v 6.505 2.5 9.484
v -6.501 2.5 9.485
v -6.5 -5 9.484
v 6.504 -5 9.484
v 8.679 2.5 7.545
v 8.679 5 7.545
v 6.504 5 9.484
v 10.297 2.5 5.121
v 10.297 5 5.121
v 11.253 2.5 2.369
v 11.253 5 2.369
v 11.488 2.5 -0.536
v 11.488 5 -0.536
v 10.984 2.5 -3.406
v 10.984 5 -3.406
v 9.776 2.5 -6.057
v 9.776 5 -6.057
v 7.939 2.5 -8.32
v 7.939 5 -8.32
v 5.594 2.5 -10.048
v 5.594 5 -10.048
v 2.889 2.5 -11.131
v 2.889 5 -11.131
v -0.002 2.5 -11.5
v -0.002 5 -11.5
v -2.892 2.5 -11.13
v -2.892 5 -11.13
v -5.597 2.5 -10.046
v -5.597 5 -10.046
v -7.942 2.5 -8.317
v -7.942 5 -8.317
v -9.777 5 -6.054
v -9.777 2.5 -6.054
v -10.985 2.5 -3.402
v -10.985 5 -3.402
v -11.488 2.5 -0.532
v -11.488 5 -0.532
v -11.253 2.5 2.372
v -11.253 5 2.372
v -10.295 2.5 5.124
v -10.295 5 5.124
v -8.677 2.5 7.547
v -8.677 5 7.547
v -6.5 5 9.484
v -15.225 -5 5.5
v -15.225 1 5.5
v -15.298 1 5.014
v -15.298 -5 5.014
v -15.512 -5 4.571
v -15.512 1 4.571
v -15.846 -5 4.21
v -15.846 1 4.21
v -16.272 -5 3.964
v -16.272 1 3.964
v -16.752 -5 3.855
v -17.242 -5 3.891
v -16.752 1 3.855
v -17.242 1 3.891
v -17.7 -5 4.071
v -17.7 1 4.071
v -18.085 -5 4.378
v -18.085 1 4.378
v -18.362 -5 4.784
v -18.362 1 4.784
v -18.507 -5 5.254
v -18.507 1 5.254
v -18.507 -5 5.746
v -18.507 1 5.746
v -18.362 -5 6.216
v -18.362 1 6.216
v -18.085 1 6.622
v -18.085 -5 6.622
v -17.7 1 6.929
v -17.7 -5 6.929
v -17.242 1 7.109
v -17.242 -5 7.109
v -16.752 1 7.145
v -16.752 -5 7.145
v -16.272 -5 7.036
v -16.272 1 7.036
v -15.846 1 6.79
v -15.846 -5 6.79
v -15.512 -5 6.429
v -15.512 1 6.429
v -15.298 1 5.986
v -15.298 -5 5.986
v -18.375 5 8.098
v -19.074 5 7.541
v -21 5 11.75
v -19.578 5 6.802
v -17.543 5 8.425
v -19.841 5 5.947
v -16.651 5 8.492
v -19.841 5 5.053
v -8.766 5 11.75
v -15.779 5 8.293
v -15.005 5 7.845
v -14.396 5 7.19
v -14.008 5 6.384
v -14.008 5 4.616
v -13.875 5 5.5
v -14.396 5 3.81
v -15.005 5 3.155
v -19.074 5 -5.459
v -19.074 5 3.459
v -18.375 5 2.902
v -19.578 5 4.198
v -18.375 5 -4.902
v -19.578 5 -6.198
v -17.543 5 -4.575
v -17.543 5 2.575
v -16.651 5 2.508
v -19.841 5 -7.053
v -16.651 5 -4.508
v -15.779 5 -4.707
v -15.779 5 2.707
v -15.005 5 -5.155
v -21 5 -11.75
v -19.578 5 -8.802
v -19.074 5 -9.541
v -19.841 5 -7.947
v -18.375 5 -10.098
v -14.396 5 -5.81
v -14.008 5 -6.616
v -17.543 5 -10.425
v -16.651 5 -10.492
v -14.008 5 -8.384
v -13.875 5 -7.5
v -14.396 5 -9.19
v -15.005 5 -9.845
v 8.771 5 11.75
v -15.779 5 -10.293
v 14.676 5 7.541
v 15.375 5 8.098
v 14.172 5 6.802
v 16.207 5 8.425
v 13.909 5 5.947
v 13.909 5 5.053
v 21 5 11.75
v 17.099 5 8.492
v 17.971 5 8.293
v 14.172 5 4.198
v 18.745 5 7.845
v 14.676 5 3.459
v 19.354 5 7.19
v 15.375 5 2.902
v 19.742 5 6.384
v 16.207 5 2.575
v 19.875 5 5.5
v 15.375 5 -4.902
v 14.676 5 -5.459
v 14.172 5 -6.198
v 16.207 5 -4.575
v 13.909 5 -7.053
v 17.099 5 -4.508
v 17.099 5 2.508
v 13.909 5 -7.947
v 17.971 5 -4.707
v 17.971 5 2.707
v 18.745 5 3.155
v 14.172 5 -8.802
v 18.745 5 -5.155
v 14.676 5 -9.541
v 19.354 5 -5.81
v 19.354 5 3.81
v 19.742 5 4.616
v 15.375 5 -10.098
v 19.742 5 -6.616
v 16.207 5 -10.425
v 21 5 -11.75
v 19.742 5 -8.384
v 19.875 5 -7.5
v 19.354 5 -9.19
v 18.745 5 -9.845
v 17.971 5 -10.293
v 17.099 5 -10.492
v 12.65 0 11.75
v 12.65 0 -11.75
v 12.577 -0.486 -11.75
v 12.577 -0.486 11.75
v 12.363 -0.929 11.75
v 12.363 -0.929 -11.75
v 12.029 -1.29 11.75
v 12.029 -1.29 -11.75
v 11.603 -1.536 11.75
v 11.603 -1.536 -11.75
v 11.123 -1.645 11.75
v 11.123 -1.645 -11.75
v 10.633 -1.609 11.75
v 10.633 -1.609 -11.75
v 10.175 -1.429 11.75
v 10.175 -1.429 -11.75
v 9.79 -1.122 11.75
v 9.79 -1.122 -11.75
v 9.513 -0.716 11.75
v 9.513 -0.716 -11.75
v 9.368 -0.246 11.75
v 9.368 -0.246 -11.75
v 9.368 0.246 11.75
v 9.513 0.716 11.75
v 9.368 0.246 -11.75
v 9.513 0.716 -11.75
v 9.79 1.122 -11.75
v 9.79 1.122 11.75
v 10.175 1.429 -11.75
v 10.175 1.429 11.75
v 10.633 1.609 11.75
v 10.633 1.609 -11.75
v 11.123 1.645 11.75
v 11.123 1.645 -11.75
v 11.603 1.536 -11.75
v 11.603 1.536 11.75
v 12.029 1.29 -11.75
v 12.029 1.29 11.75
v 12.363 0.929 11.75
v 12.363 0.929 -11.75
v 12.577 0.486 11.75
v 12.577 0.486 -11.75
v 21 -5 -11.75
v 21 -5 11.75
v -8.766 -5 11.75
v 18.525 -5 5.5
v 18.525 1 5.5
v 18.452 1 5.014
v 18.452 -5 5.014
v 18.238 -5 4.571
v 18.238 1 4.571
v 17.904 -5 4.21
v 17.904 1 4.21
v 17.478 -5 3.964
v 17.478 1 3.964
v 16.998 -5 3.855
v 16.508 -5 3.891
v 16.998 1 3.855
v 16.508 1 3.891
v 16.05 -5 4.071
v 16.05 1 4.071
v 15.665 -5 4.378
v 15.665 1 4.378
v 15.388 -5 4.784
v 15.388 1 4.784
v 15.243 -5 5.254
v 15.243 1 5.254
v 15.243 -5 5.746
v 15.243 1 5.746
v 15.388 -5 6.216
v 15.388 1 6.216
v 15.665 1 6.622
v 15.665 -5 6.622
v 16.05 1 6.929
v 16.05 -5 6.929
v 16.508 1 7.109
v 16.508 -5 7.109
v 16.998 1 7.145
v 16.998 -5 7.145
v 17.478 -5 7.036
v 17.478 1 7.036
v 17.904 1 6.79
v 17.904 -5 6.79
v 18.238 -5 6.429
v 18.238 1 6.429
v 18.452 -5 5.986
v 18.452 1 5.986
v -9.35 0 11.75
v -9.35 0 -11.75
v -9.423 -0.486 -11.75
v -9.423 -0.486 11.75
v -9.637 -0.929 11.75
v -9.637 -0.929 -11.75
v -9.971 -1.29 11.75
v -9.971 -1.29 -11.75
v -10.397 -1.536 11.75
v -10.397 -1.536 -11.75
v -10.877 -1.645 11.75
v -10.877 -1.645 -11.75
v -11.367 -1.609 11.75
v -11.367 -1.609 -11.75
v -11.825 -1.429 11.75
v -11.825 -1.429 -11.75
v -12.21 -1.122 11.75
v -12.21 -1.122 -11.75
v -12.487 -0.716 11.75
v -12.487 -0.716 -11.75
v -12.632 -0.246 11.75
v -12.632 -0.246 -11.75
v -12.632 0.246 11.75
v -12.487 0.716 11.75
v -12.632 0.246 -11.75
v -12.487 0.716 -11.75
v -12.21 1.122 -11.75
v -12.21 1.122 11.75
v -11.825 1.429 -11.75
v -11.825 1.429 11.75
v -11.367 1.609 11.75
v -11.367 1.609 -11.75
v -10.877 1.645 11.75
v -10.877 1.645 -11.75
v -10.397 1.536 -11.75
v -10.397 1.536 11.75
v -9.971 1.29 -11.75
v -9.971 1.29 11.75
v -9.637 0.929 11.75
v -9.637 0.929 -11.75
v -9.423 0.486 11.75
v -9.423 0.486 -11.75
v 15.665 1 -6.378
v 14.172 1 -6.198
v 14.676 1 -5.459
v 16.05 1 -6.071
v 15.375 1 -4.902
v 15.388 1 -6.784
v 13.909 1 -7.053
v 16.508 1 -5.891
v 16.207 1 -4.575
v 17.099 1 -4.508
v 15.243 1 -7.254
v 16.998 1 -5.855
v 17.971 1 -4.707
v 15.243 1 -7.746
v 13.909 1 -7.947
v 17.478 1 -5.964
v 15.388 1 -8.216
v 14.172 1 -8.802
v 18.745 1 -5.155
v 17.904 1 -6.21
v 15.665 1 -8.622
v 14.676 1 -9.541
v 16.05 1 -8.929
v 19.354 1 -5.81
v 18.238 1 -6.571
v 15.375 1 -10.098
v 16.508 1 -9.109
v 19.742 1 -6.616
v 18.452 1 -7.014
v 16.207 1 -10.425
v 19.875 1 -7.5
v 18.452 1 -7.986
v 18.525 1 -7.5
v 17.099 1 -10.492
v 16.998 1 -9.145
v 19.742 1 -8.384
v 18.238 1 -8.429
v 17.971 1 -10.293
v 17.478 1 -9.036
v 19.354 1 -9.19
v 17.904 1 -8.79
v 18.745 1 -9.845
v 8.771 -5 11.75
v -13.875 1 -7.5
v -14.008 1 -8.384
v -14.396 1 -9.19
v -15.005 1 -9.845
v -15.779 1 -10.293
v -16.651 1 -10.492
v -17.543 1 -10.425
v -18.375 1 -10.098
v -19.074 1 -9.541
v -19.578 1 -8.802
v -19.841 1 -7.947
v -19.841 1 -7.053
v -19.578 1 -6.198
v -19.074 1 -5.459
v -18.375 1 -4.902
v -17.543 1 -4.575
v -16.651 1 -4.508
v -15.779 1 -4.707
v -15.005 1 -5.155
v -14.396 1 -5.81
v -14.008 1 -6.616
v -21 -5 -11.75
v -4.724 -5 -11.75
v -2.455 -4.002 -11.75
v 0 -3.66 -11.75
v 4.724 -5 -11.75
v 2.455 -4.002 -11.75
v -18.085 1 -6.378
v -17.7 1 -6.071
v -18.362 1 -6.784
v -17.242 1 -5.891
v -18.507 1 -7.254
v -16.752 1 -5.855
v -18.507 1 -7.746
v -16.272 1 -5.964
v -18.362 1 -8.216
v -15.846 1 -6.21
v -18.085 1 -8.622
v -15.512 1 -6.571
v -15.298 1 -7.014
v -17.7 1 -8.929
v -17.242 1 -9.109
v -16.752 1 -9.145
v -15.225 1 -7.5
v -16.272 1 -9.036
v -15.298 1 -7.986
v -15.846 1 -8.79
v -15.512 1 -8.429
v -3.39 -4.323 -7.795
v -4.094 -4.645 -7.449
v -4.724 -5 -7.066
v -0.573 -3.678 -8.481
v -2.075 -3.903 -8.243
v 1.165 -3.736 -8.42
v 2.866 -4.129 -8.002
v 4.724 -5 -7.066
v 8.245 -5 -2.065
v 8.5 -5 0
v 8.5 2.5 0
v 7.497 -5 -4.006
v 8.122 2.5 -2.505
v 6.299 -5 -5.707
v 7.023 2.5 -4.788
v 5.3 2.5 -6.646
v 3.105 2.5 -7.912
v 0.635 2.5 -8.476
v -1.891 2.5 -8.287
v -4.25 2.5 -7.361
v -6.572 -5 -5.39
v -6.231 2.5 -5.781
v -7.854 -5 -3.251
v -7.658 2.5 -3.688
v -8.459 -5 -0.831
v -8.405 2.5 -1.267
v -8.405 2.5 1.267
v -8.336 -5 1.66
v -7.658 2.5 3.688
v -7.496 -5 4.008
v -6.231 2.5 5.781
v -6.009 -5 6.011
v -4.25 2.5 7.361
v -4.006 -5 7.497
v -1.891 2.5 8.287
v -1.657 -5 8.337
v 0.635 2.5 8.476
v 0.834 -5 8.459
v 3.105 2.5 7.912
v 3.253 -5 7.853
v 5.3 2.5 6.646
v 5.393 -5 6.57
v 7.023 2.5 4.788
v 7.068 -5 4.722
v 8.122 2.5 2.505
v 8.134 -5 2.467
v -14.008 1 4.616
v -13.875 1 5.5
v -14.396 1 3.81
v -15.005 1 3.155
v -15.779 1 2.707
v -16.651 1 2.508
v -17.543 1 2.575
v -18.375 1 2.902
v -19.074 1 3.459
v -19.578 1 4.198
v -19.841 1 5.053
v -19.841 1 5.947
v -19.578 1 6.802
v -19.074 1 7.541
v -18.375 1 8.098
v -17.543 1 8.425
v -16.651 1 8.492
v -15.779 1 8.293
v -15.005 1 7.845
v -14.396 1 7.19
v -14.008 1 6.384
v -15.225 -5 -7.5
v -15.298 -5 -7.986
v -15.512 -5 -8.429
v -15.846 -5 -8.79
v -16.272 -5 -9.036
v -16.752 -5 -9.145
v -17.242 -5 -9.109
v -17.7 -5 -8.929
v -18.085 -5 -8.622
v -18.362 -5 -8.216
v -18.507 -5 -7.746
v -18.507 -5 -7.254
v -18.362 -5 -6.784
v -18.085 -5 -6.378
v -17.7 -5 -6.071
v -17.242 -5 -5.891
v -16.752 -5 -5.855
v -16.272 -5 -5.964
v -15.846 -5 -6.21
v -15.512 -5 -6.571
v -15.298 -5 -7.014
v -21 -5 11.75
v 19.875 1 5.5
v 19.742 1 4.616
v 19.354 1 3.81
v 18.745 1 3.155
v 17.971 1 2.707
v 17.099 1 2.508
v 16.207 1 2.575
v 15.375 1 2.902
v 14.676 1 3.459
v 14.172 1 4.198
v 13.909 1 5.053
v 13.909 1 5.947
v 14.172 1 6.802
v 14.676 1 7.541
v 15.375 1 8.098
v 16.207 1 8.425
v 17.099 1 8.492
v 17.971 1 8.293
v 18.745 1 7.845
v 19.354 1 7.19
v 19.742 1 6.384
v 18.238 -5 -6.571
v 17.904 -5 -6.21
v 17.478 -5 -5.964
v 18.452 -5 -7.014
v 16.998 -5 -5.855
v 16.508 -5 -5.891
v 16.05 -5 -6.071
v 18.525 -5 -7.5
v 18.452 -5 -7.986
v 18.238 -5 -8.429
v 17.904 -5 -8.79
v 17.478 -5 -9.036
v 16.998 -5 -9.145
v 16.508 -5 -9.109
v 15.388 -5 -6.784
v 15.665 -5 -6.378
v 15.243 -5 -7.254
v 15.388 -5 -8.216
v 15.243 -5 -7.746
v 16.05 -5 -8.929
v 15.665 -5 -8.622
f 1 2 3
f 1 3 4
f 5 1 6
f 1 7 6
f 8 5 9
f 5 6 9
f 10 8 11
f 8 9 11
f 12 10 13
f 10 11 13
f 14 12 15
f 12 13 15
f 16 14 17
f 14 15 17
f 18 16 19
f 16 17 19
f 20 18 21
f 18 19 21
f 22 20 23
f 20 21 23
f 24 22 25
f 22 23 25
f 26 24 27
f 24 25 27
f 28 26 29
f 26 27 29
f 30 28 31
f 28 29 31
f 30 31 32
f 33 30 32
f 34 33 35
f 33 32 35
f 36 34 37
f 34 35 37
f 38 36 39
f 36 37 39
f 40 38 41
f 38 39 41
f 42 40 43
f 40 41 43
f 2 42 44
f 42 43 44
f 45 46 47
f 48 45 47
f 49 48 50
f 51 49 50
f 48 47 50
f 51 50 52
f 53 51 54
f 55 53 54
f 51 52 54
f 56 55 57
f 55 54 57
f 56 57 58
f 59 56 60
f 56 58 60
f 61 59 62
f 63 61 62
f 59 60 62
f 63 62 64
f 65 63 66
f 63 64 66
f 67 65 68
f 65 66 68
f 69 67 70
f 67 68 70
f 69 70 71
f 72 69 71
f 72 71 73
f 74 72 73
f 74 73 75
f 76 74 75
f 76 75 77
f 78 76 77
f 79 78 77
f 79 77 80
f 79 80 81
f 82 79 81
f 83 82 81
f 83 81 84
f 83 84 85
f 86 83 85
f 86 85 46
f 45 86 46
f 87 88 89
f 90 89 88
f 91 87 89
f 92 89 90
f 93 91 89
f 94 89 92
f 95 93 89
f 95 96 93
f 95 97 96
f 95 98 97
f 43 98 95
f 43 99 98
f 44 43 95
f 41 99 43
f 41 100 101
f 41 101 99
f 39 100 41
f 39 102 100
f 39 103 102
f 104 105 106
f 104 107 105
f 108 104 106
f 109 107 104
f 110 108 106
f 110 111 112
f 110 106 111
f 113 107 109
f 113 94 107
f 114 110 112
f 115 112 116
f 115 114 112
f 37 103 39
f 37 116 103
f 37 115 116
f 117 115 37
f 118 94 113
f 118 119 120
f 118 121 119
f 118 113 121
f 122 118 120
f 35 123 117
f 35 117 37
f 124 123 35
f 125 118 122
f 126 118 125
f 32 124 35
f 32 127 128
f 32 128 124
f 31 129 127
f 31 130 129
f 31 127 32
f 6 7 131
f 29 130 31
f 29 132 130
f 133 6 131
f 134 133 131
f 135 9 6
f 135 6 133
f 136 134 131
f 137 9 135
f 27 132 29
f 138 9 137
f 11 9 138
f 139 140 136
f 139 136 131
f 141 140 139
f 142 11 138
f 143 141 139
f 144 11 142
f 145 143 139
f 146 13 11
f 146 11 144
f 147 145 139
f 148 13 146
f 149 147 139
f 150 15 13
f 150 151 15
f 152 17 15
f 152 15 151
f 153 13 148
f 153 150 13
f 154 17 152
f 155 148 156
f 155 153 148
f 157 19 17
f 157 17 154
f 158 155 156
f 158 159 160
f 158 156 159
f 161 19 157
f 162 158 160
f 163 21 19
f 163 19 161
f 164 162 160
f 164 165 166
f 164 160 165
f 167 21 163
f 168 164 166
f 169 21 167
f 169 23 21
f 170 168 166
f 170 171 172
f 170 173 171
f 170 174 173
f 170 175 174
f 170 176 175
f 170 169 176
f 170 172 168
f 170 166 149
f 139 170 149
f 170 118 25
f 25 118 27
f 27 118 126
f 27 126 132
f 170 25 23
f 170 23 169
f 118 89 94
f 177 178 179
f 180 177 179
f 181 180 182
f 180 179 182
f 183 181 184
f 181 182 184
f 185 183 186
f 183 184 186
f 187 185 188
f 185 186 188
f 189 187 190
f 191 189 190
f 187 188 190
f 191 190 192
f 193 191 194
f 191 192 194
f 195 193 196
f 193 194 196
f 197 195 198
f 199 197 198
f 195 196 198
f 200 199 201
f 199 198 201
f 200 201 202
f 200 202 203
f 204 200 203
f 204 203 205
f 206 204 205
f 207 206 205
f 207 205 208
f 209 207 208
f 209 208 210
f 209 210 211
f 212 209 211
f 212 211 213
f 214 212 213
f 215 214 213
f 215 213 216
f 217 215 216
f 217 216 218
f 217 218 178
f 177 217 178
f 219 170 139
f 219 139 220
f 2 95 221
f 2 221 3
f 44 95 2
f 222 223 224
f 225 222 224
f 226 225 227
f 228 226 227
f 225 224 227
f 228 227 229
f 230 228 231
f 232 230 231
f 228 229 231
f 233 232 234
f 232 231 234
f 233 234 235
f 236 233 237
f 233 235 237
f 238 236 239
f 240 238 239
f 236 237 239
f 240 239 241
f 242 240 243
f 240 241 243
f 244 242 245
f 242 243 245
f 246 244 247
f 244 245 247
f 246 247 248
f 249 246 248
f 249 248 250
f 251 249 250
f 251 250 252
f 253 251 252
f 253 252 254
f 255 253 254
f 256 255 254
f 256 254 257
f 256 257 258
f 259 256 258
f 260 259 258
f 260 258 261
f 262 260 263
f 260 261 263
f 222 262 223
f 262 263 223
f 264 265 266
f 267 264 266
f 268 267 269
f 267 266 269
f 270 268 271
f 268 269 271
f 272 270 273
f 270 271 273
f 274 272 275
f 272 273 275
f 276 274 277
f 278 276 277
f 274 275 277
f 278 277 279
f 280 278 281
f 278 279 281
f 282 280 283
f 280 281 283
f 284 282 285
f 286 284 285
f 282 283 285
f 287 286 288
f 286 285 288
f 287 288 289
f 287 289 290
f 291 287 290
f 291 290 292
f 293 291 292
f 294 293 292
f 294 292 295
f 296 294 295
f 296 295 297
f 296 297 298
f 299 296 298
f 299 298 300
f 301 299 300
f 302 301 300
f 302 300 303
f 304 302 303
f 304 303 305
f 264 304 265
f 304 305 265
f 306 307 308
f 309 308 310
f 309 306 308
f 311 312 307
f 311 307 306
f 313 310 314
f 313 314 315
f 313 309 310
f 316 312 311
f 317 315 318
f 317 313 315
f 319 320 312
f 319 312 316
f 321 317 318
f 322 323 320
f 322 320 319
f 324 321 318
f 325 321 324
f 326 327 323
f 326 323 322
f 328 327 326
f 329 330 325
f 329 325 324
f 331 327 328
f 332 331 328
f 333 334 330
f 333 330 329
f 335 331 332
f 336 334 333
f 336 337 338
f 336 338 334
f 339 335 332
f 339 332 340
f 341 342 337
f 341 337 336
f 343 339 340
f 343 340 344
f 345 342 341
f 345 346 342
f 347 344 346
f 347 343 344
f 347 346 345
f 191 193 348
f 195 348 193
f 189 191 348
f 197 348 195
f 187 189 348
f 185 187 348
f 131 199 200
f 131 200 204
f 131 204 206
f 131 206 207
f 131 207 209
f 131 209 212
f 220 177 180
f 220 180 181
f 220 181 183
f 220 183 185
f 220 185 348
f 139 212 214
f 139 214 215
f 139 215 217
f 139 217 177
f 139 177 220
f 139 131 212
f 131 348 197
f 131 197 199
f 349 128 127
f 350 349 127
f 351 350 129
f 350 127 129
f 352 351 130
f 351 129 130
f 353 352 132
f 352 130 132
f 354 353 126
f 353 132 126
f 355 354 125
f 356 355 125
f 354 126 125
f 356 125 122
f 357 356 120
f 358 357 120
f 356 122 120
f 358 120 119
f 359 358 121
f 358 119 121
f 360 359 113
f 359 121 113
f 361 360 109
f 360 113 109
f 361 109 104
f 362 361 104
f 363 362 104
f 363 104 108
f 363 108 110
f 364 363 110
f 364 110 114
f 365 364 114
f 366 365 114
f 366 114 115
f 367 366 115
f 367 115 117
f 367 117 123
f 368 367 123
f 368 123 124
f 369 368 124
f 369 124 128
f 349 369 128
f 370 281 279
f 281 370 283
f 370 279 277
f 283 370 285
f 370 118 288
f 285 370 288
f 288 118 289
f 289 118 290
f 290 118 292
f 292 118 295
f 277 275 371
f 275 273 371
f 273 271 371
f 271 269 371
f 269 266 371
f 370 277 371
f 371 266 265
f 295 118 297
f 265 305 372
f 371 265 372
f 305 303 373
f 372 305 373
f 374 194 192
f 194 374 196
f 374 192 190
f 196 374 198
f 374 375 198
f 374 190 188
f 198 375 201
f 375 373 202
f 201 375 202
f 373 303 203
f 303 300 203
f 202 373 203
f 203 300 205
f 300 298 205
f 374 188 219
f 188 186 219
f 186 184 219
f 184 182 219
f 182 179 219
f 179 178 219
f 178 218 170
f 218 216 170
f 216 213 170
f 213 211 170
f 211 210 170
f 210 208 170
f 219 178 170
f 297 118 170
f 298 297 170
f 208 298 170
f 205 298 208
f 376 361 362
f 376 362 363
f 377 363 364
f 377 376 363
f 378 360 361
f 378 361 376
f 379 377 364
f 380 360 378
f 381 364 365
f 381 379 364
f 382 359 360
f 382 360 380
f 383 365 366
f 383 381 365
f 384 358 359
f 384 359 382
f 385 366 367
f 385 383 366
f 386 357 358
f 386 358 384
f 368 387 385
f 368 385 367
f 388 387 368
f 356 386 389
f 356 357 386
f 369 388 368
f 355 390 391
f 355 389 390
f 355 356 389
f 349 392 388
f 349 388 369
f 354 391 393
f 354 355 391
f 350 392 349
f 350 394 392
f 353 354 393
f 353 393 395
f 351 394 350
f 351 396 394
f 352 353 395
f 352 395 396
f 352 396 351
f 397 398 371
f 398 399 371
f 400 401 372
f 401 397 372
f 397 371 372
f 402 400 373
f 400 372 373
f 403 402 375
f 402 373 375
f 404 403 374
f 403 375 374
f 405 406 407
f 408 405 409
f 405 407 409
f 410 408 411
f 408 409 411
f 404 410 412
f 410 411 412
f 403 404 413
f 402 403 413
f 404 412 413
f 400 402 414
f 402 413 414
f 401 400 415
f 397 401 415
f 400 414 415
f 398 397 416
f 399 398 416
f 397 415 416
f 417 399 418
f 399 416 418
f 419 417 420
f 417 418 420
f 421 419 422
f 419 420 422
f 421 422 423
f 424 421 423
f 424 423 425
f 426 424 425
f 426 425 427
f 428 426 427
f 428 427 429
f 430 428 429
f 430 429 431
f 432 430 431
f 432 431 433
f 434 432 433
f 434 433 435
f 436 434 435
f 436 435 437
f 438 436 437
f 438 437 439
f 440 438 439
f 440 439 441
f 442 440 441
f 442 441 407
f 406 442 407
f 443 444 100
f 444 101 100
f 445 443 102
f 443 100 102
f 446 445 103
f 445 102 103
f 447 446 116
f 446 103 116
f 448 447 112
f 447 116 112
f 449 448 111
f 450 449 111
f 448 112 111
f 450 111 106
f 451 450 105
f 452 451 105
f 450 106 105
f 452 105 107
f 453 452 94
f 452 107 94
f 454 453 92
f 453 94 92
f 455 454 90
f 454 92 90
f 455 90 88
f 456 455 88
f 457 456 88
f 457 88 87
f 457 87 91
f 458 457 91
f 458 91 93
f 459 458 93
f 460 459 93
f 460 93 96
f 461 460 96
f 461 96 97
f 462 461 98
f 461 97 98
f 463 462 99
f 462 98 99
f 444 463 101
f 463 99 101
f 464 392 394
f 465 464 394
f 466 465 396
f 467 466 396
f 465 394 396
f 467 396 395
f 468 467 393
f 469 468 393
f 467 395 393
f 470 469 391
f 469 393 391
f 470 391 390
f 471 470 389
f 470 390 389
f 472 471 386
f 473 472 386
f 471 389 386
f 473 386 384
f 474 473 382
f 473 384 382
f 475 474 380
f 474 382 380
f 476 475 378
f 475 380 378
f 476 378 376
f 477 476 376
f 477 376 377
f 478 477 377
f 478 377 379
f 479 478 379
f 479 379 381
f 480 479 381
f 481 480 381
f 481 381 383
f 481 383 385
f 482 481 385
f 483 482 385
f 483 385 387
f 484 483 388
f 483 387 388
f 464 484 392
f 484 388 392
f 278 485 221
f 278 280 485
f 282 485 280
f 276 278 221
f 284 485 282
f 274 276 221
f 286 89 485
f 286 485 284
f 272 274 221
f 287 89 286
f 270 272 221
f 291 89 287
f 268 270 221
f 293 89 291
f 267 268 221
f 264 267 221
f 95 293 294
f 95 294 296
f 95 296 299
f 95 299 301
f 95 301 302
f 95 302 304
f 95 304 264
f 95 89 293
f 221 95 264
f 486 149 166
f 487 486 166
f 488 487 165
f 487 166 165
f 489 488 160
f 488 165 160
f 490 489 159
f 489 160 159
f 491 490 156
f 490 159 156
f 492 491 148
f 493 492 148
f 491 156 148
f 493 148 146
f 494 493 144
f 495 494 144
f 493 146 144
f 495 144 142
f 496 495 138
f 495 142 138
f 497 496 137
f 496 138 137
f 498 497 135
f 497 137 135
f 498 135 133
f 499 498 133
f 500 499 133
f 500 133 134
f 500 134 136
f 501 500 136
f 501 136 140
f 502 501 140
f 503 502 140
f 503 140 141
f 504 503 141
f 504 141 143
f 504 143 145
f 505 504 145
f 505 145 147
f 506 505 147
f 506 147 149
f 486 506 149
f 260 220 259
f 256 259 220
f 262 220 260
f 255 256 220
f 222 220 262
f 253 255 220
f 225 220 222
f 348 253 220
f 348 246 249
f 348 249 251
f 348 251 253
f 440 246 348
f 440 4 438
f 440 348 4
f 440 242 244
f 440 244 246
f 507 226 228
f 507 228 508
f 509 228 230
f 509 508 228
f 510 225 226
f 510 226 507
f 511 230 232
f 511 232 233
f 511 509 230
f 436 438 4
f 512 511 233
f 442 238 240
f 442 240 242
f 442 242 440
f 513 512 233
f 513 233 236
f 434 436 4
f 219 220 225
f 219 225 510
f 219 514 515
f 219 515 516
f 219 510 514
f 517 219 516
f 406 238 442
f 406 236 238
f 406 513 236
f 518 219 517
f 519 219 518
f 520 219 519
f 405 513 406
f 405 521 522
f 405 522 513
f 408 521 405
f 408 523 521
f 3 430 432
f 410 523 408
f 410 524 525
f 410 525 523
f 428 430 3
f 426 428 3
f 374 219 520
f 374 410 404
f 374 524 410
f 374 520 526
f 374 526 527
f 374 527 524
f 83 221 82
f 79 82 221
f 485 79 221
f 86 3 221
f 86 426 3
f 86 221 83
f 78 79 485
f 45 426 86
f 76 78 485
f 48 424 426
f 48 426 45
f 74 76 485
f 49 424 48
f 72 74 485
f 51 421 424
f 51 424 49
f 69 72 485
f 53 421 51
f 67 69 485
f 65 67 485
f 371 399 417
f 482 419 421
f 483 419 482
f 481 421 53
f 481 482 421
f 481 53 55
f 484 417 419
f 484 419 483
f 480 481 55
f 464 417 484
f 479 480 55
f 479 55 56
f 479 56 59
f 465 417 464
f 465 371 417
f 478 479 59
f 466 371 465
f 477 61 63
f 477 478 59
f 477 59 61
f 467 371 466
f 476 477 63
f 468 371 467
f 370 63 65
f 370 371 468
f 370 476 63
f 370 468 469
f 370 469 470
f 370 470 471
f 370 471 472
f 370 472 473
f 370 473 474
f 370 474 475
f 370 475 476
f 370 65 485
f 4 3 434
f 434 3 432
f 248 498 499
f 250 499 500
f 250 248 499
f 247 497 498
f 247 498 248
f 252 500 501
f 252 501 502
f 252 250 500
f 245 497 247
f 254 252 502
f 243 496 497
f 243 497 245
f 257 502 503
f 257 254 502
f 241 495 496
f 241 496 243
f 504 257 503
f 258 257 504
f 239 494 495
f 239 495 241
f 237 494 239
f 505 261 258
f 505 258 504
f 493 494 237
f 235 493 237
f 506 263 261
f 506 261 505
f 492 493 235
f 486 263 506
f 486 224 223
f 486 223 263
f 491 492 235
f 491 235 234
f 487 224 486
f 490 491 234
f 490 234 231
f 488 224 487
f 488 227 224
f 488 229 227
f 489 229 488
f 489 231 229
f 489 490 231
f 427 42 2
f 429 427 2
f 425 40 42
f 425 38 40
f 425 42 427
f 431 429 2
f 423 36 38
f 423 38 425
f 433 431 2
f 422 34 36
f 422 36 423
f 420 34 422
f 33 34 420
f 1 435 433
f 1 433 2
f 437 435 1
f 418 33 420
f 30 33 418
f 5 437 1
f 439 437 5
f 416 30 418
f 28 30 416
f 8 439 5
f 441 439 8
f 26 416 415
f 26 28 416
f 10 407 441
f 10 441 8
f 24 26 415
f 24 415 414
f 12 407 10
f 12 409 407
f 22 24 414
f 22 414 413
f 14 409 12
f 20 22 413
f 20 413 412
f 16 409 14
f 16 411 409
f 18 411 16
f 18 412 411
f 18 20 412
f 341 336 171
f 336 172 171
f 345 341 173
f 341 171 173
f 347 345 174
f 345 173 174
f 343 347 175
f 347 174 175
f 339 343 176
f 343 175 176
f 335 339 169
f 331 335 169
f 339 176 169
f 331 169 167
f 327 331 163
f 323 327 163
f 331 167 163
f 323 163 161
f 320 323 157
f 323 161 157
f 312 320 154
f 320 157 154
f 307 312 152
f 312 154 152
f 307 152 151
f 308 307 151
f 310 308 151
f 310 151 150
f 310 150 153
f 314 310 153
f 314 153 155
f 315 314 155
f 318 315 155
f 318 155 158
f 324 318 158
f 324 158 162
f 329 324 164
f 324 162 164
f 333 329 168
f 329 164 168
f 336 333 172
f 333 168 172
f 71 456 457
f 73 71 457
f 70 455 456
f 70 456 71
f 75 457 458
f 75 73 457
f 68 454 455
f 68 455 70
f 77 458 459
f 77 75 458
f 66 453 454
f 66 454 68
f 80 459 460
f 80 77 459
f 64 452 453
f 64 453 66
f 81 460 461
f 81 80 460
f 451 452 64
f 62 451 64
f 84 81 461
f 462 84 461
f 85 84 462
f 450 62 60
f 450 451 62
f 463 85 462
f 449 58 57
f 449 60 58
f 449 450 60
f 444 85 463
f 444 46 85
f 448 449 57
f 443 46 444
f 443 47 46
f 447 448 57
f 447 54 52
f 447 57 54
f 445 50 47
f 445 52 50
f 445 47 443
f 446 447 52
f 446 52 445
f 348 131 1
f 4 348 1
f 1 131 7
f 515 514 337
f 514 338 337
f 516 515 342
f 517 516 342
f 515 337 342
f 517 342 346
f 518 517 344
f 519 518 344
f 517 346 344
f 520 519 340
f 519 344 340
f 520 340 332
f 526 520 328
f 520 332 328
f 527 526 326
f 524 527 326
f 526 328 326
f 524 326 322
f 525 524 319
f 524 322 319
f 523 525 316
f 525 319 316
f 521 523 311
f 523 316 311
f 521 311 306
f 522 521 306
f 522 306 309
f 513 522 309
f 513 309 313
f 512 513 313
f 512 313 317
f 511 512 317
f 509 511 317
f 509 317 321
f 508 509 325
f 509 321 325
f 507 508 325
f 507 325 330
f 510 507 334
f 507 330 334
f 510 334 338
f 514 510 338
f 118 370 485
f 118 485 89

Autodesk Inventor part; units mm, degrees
ref_plane "YZ Plane" through (0, 0, 0) normal (1, 0, 0) x (0, 1, 0)
ref_plane "XZ Plane" through (0, 0, 0) normal (0, 1, 0) x (-1, 0, 0)
ref_plane "XY Plane" through (0, 0, 0) normal (0, 0, 1) x (1, 0, 0)
sketch "草圖4" plane through (0, 0, 0) normal (0, 0, 1) x (1, 0, 0)
  line L0 (-29.4, 0) -> (29.4, 0) projected
  line L1 (0, -7) -> (0, 7) projected
  line L2 (-21, 5) -> (21, 5)
  line L3 (21, 5) -> (21, -5)
  line L4 (21, -5) -> (-21, -5)
  line L5 (-21, -5) -> (-21, 5)
  circle A0 centre (-11, 0) radius 1.65
  circle A1 centre (11, 0) radius 1.65
  point P0 (0, 0)
  dimension "d20" = 42
  dimension "d21" = 10
  dimension "d22" = 3.3
  dimension "d23" = 3.3
  dimension "d24" = 10
  dimension "d25" = 10
extrude "擠出3" add sketch "草圖4" along normal mid plane 23.5 contours L5 L2 L1 L0 A0 | L0 A0 L1 L4 L5 | L1 L0 A1 L3 L4 | L2 L3 L0 A1 L1
sketch "草圖5" plane through (-21, 5, 11.75) normal (0, 1, 0) x (1, 0, 0)
  line L0 (0, 0) -> (0, 23.5) projected
  line L1 (42, 0) -> (0, 0) projected
  line L2 (42, 23.5) -> (42, 0) projected
  line L3 (0, 23.5) -> (42, 23.5) projected
  circle A0 centre (21, 11.75) radius 8.5
  circle A1 centre (4.125, 19.25) radius 1.65
  circle A2 centre (4.125, 6.25) radius 1.65
  line L4 (42, 23.5) -> (0, 23.5) projected
  line L5 (21, 23.5) -> (21, 25.0136)
  circle A3 centre (37.875, 19.25) radius 1.65
  circle A4 centre (37.875, 6.25) radius 1.65
  circle A5 centre (4.125, 19.25) radius 3
  circle A6 centre (4.125, 6.25) radius 3
  circle A7 centre (37.875, 19.25) radius 3
  circle A8 centre (37.875, 6.25) radius 3
  dimension "d28" = 17
  dimension "d31" = 3.3
  dimension "d32" = 3.3
  dimension "d33" = 4.125
  dimension "d34" = 4.25
  dimension "d35" = 6.25
  dimension "d36" = 4.125
  dimension "d37" = 6
  dimension "d38" = 6
extrude "擠出4" cut sketch "草圖5" against normal up to surface (10 mm away) contours A0 | A1 | A2 | A3 | A4
extrude "擠出5" cut sketch "草圖5" against normal blind 4 contours A5 | A6 | A7 | A8
sketch "草圖7" plane through (0, 0, -11.75) normal (0, 0, -1) x (-1, 0, 0)
  circle A0 centre (11, 0) radius 2.75 projected
  circle A1 centre (-11, 0) radius 2.75 projected
  arc A2 (5, -4) -> (-5, -4) centre (0, -12.6603) ccw projected
  line L0 (18.5, -4) -> (5, -4) projected
  line L1 (18.5, -4) -> (18.5, 4) projected
  line L2 (18.5, 4) -> (-18.5, 4) projected
  line L3 (-18.5, 4) -> (-18.5, -4) projected
  line L4 (-5, -4) -> (-18.5, -4) projected
  line L5 (21, -5) -> (21, 5) projected
  line L6 (21, 5) -> (-21, 5) projected
  line L7 (-21, 5) -> (-21, -5) projected
  line L8 (-21, -5) -> (21, -5) projected
  circle A3 centre (-11, 0) radius 1.65 projected
  circle A4 centre (11, 0) radius 1.65 projected
  arc A5 (4.7245, -5) -> (-4.7245, -5) centre (0, -12.6603) ccw
  line L9 (4.7245, -5) -> (19.5, -5)
  line L10 (19.5, -5) -> (19.5, 5)
  line L11 (19.5, 5) -> (-19.5, 5)
  line L12 (-19.5, 5) -> (-19.5, -5)
  line L13 (-19.5, -5) -> (-4.7245, -5)
  point P0 (0, 0)
  point P1 (-5, -4)
  point P2 (5, -4)
  point P3 (-4.7245, -5)
extrude "擠出7" cut sketch "草圖7" against normal blind 8.65 contours L8 A5
sketch "草圖8" plane through (-21, 5, 11.75) normal (0, 1, 0) x (1, 0, 0)
  circle A0 centre (37.875, 6.25) radius 3 projected
  circle A1 centre (4.125, 6.25) radius 3 projected
  circle A2 centre (21, 11.75) radius 8.5 projected
  line L0 (0, 0) -> (0, 23.5) projected
  line L1 (42, 0) -> (0, 0) projected
  line L2 (42, 23.5) -> (42, 0) projected
  circle A3 centre (21, 11.75) radius 11.5
  line L3 (0, 23.5) -> (42, 23.5) projected
  dimension "d45" = 23
extrude "擠出8" cut sketch "草圖8" against normal blind 2.5 contours A0 | A1 | A2 | A3
sketch "草圖10" plane through (-21, 5, 11.75) normal (0, 1, 0) x (1, 0, 0)
  circle A0 centre (26.5805, -1.1666) radius 1.5 projected
  circle A1 centre (26.5805, -1.1666) radius 2.75
  point P0 (21, 11.75)
  dimension "d55" = 5.5
extrude "擠出10" cut sketch "草圖10" against normal up to surface (10 mm away) contours A0 | A1
sketch "草圖11" plane through (-21, 5, -11.75) normal (0, 1, 0) x (1, 0, 0)
  circle A0 centre (15.3833, -24.75) radius 1.5
  circle A1 centre (15.3833, -24.75) radius 2.75
  point P0 (21, -11.75)
  dimension "d58" = 5.5
extrude "擠出11" cut sketch "草圖11" against normal up to surface (10 mm away) contours A0 | A1
sketch "草圖12" plane through (-21, 5, -11.75) normal (0, 1, 0) x (1, 0, 0)
  arc A0 (15.8732, -22.044) -> (12.9338, -23.5) centre (15.3833, -24.75) ccw projected
  arc A1 (26.3579, -21.9256) -> (15.8732, -22.044) centre (21, -11.75) ccw projected
  arc A2 (29.0708, -23.5) -> (26.3579, -21.9256) centre (26.5805, -24.6666) ccw projected
  line L0 (42, -23.5) -> (29.0708, -23.5) projected
  line L1 (42, 0) -> (42, -23.5) projected
  line L2 (0, 0) -> (42, 0) projected
  line L3 (0, -23.5) -> (0, 0) projected
  line L4 (12.9338, -23.5) -> (0, -23.5) projected
  circle A3 centre (37.875, -17.25) radius 3 projected
  circle A4 centre (4.125, -17.25) radius 3 projected
  circle A5 centre (37.875, -4.25) radius 3 projected
  circle A6 centre (4.125, -4.25) radius 3 projected
  line L5 (42, -23.5) -> (29.0708, -23.5) projected
  line L6 (29.7708, -23.5) -> (12.2338, -23.5)
  line L7 (12.2338, -23.5) -> (12.2338, -21.2337)
  line L8 (12.2338, -21.2337) -> (29.7708, -21.2337)
  line L9 (29.7708, -21.2337) -> (29.7708, -23.5)
  line L10 (29.7708, -23.5) -> (27.5045, -21.2337)
  line L11 (29.7708, -23.5) -> (32.9758, -23.5) construction
  line L12 (12.2338, -23.5) -> (14.5001, -21.2337)
  line L13 (12.2338, -23.5) -> (15.4388, -23.5) construction
  arc A7 (26.3579, -21.9256) -> (15.8732, -22.044) centre (21, -11.75) ccw projected
  point P0 (12.9338, -23.5)
  dimension "d62" = 0.7
  dimension "d63" = 0.7
  dimension "d64" = 135
  dimension "d65" = 45
extrude "擠出12" cut sketch "草圖12" against normal up to surface (10 mm away) contours A1 L8 A2 L6 A0 | A0 L4 L12 A1 | A2 A1 L10 L0
properties part number "y_motor_lock_top2_3D 列印"
